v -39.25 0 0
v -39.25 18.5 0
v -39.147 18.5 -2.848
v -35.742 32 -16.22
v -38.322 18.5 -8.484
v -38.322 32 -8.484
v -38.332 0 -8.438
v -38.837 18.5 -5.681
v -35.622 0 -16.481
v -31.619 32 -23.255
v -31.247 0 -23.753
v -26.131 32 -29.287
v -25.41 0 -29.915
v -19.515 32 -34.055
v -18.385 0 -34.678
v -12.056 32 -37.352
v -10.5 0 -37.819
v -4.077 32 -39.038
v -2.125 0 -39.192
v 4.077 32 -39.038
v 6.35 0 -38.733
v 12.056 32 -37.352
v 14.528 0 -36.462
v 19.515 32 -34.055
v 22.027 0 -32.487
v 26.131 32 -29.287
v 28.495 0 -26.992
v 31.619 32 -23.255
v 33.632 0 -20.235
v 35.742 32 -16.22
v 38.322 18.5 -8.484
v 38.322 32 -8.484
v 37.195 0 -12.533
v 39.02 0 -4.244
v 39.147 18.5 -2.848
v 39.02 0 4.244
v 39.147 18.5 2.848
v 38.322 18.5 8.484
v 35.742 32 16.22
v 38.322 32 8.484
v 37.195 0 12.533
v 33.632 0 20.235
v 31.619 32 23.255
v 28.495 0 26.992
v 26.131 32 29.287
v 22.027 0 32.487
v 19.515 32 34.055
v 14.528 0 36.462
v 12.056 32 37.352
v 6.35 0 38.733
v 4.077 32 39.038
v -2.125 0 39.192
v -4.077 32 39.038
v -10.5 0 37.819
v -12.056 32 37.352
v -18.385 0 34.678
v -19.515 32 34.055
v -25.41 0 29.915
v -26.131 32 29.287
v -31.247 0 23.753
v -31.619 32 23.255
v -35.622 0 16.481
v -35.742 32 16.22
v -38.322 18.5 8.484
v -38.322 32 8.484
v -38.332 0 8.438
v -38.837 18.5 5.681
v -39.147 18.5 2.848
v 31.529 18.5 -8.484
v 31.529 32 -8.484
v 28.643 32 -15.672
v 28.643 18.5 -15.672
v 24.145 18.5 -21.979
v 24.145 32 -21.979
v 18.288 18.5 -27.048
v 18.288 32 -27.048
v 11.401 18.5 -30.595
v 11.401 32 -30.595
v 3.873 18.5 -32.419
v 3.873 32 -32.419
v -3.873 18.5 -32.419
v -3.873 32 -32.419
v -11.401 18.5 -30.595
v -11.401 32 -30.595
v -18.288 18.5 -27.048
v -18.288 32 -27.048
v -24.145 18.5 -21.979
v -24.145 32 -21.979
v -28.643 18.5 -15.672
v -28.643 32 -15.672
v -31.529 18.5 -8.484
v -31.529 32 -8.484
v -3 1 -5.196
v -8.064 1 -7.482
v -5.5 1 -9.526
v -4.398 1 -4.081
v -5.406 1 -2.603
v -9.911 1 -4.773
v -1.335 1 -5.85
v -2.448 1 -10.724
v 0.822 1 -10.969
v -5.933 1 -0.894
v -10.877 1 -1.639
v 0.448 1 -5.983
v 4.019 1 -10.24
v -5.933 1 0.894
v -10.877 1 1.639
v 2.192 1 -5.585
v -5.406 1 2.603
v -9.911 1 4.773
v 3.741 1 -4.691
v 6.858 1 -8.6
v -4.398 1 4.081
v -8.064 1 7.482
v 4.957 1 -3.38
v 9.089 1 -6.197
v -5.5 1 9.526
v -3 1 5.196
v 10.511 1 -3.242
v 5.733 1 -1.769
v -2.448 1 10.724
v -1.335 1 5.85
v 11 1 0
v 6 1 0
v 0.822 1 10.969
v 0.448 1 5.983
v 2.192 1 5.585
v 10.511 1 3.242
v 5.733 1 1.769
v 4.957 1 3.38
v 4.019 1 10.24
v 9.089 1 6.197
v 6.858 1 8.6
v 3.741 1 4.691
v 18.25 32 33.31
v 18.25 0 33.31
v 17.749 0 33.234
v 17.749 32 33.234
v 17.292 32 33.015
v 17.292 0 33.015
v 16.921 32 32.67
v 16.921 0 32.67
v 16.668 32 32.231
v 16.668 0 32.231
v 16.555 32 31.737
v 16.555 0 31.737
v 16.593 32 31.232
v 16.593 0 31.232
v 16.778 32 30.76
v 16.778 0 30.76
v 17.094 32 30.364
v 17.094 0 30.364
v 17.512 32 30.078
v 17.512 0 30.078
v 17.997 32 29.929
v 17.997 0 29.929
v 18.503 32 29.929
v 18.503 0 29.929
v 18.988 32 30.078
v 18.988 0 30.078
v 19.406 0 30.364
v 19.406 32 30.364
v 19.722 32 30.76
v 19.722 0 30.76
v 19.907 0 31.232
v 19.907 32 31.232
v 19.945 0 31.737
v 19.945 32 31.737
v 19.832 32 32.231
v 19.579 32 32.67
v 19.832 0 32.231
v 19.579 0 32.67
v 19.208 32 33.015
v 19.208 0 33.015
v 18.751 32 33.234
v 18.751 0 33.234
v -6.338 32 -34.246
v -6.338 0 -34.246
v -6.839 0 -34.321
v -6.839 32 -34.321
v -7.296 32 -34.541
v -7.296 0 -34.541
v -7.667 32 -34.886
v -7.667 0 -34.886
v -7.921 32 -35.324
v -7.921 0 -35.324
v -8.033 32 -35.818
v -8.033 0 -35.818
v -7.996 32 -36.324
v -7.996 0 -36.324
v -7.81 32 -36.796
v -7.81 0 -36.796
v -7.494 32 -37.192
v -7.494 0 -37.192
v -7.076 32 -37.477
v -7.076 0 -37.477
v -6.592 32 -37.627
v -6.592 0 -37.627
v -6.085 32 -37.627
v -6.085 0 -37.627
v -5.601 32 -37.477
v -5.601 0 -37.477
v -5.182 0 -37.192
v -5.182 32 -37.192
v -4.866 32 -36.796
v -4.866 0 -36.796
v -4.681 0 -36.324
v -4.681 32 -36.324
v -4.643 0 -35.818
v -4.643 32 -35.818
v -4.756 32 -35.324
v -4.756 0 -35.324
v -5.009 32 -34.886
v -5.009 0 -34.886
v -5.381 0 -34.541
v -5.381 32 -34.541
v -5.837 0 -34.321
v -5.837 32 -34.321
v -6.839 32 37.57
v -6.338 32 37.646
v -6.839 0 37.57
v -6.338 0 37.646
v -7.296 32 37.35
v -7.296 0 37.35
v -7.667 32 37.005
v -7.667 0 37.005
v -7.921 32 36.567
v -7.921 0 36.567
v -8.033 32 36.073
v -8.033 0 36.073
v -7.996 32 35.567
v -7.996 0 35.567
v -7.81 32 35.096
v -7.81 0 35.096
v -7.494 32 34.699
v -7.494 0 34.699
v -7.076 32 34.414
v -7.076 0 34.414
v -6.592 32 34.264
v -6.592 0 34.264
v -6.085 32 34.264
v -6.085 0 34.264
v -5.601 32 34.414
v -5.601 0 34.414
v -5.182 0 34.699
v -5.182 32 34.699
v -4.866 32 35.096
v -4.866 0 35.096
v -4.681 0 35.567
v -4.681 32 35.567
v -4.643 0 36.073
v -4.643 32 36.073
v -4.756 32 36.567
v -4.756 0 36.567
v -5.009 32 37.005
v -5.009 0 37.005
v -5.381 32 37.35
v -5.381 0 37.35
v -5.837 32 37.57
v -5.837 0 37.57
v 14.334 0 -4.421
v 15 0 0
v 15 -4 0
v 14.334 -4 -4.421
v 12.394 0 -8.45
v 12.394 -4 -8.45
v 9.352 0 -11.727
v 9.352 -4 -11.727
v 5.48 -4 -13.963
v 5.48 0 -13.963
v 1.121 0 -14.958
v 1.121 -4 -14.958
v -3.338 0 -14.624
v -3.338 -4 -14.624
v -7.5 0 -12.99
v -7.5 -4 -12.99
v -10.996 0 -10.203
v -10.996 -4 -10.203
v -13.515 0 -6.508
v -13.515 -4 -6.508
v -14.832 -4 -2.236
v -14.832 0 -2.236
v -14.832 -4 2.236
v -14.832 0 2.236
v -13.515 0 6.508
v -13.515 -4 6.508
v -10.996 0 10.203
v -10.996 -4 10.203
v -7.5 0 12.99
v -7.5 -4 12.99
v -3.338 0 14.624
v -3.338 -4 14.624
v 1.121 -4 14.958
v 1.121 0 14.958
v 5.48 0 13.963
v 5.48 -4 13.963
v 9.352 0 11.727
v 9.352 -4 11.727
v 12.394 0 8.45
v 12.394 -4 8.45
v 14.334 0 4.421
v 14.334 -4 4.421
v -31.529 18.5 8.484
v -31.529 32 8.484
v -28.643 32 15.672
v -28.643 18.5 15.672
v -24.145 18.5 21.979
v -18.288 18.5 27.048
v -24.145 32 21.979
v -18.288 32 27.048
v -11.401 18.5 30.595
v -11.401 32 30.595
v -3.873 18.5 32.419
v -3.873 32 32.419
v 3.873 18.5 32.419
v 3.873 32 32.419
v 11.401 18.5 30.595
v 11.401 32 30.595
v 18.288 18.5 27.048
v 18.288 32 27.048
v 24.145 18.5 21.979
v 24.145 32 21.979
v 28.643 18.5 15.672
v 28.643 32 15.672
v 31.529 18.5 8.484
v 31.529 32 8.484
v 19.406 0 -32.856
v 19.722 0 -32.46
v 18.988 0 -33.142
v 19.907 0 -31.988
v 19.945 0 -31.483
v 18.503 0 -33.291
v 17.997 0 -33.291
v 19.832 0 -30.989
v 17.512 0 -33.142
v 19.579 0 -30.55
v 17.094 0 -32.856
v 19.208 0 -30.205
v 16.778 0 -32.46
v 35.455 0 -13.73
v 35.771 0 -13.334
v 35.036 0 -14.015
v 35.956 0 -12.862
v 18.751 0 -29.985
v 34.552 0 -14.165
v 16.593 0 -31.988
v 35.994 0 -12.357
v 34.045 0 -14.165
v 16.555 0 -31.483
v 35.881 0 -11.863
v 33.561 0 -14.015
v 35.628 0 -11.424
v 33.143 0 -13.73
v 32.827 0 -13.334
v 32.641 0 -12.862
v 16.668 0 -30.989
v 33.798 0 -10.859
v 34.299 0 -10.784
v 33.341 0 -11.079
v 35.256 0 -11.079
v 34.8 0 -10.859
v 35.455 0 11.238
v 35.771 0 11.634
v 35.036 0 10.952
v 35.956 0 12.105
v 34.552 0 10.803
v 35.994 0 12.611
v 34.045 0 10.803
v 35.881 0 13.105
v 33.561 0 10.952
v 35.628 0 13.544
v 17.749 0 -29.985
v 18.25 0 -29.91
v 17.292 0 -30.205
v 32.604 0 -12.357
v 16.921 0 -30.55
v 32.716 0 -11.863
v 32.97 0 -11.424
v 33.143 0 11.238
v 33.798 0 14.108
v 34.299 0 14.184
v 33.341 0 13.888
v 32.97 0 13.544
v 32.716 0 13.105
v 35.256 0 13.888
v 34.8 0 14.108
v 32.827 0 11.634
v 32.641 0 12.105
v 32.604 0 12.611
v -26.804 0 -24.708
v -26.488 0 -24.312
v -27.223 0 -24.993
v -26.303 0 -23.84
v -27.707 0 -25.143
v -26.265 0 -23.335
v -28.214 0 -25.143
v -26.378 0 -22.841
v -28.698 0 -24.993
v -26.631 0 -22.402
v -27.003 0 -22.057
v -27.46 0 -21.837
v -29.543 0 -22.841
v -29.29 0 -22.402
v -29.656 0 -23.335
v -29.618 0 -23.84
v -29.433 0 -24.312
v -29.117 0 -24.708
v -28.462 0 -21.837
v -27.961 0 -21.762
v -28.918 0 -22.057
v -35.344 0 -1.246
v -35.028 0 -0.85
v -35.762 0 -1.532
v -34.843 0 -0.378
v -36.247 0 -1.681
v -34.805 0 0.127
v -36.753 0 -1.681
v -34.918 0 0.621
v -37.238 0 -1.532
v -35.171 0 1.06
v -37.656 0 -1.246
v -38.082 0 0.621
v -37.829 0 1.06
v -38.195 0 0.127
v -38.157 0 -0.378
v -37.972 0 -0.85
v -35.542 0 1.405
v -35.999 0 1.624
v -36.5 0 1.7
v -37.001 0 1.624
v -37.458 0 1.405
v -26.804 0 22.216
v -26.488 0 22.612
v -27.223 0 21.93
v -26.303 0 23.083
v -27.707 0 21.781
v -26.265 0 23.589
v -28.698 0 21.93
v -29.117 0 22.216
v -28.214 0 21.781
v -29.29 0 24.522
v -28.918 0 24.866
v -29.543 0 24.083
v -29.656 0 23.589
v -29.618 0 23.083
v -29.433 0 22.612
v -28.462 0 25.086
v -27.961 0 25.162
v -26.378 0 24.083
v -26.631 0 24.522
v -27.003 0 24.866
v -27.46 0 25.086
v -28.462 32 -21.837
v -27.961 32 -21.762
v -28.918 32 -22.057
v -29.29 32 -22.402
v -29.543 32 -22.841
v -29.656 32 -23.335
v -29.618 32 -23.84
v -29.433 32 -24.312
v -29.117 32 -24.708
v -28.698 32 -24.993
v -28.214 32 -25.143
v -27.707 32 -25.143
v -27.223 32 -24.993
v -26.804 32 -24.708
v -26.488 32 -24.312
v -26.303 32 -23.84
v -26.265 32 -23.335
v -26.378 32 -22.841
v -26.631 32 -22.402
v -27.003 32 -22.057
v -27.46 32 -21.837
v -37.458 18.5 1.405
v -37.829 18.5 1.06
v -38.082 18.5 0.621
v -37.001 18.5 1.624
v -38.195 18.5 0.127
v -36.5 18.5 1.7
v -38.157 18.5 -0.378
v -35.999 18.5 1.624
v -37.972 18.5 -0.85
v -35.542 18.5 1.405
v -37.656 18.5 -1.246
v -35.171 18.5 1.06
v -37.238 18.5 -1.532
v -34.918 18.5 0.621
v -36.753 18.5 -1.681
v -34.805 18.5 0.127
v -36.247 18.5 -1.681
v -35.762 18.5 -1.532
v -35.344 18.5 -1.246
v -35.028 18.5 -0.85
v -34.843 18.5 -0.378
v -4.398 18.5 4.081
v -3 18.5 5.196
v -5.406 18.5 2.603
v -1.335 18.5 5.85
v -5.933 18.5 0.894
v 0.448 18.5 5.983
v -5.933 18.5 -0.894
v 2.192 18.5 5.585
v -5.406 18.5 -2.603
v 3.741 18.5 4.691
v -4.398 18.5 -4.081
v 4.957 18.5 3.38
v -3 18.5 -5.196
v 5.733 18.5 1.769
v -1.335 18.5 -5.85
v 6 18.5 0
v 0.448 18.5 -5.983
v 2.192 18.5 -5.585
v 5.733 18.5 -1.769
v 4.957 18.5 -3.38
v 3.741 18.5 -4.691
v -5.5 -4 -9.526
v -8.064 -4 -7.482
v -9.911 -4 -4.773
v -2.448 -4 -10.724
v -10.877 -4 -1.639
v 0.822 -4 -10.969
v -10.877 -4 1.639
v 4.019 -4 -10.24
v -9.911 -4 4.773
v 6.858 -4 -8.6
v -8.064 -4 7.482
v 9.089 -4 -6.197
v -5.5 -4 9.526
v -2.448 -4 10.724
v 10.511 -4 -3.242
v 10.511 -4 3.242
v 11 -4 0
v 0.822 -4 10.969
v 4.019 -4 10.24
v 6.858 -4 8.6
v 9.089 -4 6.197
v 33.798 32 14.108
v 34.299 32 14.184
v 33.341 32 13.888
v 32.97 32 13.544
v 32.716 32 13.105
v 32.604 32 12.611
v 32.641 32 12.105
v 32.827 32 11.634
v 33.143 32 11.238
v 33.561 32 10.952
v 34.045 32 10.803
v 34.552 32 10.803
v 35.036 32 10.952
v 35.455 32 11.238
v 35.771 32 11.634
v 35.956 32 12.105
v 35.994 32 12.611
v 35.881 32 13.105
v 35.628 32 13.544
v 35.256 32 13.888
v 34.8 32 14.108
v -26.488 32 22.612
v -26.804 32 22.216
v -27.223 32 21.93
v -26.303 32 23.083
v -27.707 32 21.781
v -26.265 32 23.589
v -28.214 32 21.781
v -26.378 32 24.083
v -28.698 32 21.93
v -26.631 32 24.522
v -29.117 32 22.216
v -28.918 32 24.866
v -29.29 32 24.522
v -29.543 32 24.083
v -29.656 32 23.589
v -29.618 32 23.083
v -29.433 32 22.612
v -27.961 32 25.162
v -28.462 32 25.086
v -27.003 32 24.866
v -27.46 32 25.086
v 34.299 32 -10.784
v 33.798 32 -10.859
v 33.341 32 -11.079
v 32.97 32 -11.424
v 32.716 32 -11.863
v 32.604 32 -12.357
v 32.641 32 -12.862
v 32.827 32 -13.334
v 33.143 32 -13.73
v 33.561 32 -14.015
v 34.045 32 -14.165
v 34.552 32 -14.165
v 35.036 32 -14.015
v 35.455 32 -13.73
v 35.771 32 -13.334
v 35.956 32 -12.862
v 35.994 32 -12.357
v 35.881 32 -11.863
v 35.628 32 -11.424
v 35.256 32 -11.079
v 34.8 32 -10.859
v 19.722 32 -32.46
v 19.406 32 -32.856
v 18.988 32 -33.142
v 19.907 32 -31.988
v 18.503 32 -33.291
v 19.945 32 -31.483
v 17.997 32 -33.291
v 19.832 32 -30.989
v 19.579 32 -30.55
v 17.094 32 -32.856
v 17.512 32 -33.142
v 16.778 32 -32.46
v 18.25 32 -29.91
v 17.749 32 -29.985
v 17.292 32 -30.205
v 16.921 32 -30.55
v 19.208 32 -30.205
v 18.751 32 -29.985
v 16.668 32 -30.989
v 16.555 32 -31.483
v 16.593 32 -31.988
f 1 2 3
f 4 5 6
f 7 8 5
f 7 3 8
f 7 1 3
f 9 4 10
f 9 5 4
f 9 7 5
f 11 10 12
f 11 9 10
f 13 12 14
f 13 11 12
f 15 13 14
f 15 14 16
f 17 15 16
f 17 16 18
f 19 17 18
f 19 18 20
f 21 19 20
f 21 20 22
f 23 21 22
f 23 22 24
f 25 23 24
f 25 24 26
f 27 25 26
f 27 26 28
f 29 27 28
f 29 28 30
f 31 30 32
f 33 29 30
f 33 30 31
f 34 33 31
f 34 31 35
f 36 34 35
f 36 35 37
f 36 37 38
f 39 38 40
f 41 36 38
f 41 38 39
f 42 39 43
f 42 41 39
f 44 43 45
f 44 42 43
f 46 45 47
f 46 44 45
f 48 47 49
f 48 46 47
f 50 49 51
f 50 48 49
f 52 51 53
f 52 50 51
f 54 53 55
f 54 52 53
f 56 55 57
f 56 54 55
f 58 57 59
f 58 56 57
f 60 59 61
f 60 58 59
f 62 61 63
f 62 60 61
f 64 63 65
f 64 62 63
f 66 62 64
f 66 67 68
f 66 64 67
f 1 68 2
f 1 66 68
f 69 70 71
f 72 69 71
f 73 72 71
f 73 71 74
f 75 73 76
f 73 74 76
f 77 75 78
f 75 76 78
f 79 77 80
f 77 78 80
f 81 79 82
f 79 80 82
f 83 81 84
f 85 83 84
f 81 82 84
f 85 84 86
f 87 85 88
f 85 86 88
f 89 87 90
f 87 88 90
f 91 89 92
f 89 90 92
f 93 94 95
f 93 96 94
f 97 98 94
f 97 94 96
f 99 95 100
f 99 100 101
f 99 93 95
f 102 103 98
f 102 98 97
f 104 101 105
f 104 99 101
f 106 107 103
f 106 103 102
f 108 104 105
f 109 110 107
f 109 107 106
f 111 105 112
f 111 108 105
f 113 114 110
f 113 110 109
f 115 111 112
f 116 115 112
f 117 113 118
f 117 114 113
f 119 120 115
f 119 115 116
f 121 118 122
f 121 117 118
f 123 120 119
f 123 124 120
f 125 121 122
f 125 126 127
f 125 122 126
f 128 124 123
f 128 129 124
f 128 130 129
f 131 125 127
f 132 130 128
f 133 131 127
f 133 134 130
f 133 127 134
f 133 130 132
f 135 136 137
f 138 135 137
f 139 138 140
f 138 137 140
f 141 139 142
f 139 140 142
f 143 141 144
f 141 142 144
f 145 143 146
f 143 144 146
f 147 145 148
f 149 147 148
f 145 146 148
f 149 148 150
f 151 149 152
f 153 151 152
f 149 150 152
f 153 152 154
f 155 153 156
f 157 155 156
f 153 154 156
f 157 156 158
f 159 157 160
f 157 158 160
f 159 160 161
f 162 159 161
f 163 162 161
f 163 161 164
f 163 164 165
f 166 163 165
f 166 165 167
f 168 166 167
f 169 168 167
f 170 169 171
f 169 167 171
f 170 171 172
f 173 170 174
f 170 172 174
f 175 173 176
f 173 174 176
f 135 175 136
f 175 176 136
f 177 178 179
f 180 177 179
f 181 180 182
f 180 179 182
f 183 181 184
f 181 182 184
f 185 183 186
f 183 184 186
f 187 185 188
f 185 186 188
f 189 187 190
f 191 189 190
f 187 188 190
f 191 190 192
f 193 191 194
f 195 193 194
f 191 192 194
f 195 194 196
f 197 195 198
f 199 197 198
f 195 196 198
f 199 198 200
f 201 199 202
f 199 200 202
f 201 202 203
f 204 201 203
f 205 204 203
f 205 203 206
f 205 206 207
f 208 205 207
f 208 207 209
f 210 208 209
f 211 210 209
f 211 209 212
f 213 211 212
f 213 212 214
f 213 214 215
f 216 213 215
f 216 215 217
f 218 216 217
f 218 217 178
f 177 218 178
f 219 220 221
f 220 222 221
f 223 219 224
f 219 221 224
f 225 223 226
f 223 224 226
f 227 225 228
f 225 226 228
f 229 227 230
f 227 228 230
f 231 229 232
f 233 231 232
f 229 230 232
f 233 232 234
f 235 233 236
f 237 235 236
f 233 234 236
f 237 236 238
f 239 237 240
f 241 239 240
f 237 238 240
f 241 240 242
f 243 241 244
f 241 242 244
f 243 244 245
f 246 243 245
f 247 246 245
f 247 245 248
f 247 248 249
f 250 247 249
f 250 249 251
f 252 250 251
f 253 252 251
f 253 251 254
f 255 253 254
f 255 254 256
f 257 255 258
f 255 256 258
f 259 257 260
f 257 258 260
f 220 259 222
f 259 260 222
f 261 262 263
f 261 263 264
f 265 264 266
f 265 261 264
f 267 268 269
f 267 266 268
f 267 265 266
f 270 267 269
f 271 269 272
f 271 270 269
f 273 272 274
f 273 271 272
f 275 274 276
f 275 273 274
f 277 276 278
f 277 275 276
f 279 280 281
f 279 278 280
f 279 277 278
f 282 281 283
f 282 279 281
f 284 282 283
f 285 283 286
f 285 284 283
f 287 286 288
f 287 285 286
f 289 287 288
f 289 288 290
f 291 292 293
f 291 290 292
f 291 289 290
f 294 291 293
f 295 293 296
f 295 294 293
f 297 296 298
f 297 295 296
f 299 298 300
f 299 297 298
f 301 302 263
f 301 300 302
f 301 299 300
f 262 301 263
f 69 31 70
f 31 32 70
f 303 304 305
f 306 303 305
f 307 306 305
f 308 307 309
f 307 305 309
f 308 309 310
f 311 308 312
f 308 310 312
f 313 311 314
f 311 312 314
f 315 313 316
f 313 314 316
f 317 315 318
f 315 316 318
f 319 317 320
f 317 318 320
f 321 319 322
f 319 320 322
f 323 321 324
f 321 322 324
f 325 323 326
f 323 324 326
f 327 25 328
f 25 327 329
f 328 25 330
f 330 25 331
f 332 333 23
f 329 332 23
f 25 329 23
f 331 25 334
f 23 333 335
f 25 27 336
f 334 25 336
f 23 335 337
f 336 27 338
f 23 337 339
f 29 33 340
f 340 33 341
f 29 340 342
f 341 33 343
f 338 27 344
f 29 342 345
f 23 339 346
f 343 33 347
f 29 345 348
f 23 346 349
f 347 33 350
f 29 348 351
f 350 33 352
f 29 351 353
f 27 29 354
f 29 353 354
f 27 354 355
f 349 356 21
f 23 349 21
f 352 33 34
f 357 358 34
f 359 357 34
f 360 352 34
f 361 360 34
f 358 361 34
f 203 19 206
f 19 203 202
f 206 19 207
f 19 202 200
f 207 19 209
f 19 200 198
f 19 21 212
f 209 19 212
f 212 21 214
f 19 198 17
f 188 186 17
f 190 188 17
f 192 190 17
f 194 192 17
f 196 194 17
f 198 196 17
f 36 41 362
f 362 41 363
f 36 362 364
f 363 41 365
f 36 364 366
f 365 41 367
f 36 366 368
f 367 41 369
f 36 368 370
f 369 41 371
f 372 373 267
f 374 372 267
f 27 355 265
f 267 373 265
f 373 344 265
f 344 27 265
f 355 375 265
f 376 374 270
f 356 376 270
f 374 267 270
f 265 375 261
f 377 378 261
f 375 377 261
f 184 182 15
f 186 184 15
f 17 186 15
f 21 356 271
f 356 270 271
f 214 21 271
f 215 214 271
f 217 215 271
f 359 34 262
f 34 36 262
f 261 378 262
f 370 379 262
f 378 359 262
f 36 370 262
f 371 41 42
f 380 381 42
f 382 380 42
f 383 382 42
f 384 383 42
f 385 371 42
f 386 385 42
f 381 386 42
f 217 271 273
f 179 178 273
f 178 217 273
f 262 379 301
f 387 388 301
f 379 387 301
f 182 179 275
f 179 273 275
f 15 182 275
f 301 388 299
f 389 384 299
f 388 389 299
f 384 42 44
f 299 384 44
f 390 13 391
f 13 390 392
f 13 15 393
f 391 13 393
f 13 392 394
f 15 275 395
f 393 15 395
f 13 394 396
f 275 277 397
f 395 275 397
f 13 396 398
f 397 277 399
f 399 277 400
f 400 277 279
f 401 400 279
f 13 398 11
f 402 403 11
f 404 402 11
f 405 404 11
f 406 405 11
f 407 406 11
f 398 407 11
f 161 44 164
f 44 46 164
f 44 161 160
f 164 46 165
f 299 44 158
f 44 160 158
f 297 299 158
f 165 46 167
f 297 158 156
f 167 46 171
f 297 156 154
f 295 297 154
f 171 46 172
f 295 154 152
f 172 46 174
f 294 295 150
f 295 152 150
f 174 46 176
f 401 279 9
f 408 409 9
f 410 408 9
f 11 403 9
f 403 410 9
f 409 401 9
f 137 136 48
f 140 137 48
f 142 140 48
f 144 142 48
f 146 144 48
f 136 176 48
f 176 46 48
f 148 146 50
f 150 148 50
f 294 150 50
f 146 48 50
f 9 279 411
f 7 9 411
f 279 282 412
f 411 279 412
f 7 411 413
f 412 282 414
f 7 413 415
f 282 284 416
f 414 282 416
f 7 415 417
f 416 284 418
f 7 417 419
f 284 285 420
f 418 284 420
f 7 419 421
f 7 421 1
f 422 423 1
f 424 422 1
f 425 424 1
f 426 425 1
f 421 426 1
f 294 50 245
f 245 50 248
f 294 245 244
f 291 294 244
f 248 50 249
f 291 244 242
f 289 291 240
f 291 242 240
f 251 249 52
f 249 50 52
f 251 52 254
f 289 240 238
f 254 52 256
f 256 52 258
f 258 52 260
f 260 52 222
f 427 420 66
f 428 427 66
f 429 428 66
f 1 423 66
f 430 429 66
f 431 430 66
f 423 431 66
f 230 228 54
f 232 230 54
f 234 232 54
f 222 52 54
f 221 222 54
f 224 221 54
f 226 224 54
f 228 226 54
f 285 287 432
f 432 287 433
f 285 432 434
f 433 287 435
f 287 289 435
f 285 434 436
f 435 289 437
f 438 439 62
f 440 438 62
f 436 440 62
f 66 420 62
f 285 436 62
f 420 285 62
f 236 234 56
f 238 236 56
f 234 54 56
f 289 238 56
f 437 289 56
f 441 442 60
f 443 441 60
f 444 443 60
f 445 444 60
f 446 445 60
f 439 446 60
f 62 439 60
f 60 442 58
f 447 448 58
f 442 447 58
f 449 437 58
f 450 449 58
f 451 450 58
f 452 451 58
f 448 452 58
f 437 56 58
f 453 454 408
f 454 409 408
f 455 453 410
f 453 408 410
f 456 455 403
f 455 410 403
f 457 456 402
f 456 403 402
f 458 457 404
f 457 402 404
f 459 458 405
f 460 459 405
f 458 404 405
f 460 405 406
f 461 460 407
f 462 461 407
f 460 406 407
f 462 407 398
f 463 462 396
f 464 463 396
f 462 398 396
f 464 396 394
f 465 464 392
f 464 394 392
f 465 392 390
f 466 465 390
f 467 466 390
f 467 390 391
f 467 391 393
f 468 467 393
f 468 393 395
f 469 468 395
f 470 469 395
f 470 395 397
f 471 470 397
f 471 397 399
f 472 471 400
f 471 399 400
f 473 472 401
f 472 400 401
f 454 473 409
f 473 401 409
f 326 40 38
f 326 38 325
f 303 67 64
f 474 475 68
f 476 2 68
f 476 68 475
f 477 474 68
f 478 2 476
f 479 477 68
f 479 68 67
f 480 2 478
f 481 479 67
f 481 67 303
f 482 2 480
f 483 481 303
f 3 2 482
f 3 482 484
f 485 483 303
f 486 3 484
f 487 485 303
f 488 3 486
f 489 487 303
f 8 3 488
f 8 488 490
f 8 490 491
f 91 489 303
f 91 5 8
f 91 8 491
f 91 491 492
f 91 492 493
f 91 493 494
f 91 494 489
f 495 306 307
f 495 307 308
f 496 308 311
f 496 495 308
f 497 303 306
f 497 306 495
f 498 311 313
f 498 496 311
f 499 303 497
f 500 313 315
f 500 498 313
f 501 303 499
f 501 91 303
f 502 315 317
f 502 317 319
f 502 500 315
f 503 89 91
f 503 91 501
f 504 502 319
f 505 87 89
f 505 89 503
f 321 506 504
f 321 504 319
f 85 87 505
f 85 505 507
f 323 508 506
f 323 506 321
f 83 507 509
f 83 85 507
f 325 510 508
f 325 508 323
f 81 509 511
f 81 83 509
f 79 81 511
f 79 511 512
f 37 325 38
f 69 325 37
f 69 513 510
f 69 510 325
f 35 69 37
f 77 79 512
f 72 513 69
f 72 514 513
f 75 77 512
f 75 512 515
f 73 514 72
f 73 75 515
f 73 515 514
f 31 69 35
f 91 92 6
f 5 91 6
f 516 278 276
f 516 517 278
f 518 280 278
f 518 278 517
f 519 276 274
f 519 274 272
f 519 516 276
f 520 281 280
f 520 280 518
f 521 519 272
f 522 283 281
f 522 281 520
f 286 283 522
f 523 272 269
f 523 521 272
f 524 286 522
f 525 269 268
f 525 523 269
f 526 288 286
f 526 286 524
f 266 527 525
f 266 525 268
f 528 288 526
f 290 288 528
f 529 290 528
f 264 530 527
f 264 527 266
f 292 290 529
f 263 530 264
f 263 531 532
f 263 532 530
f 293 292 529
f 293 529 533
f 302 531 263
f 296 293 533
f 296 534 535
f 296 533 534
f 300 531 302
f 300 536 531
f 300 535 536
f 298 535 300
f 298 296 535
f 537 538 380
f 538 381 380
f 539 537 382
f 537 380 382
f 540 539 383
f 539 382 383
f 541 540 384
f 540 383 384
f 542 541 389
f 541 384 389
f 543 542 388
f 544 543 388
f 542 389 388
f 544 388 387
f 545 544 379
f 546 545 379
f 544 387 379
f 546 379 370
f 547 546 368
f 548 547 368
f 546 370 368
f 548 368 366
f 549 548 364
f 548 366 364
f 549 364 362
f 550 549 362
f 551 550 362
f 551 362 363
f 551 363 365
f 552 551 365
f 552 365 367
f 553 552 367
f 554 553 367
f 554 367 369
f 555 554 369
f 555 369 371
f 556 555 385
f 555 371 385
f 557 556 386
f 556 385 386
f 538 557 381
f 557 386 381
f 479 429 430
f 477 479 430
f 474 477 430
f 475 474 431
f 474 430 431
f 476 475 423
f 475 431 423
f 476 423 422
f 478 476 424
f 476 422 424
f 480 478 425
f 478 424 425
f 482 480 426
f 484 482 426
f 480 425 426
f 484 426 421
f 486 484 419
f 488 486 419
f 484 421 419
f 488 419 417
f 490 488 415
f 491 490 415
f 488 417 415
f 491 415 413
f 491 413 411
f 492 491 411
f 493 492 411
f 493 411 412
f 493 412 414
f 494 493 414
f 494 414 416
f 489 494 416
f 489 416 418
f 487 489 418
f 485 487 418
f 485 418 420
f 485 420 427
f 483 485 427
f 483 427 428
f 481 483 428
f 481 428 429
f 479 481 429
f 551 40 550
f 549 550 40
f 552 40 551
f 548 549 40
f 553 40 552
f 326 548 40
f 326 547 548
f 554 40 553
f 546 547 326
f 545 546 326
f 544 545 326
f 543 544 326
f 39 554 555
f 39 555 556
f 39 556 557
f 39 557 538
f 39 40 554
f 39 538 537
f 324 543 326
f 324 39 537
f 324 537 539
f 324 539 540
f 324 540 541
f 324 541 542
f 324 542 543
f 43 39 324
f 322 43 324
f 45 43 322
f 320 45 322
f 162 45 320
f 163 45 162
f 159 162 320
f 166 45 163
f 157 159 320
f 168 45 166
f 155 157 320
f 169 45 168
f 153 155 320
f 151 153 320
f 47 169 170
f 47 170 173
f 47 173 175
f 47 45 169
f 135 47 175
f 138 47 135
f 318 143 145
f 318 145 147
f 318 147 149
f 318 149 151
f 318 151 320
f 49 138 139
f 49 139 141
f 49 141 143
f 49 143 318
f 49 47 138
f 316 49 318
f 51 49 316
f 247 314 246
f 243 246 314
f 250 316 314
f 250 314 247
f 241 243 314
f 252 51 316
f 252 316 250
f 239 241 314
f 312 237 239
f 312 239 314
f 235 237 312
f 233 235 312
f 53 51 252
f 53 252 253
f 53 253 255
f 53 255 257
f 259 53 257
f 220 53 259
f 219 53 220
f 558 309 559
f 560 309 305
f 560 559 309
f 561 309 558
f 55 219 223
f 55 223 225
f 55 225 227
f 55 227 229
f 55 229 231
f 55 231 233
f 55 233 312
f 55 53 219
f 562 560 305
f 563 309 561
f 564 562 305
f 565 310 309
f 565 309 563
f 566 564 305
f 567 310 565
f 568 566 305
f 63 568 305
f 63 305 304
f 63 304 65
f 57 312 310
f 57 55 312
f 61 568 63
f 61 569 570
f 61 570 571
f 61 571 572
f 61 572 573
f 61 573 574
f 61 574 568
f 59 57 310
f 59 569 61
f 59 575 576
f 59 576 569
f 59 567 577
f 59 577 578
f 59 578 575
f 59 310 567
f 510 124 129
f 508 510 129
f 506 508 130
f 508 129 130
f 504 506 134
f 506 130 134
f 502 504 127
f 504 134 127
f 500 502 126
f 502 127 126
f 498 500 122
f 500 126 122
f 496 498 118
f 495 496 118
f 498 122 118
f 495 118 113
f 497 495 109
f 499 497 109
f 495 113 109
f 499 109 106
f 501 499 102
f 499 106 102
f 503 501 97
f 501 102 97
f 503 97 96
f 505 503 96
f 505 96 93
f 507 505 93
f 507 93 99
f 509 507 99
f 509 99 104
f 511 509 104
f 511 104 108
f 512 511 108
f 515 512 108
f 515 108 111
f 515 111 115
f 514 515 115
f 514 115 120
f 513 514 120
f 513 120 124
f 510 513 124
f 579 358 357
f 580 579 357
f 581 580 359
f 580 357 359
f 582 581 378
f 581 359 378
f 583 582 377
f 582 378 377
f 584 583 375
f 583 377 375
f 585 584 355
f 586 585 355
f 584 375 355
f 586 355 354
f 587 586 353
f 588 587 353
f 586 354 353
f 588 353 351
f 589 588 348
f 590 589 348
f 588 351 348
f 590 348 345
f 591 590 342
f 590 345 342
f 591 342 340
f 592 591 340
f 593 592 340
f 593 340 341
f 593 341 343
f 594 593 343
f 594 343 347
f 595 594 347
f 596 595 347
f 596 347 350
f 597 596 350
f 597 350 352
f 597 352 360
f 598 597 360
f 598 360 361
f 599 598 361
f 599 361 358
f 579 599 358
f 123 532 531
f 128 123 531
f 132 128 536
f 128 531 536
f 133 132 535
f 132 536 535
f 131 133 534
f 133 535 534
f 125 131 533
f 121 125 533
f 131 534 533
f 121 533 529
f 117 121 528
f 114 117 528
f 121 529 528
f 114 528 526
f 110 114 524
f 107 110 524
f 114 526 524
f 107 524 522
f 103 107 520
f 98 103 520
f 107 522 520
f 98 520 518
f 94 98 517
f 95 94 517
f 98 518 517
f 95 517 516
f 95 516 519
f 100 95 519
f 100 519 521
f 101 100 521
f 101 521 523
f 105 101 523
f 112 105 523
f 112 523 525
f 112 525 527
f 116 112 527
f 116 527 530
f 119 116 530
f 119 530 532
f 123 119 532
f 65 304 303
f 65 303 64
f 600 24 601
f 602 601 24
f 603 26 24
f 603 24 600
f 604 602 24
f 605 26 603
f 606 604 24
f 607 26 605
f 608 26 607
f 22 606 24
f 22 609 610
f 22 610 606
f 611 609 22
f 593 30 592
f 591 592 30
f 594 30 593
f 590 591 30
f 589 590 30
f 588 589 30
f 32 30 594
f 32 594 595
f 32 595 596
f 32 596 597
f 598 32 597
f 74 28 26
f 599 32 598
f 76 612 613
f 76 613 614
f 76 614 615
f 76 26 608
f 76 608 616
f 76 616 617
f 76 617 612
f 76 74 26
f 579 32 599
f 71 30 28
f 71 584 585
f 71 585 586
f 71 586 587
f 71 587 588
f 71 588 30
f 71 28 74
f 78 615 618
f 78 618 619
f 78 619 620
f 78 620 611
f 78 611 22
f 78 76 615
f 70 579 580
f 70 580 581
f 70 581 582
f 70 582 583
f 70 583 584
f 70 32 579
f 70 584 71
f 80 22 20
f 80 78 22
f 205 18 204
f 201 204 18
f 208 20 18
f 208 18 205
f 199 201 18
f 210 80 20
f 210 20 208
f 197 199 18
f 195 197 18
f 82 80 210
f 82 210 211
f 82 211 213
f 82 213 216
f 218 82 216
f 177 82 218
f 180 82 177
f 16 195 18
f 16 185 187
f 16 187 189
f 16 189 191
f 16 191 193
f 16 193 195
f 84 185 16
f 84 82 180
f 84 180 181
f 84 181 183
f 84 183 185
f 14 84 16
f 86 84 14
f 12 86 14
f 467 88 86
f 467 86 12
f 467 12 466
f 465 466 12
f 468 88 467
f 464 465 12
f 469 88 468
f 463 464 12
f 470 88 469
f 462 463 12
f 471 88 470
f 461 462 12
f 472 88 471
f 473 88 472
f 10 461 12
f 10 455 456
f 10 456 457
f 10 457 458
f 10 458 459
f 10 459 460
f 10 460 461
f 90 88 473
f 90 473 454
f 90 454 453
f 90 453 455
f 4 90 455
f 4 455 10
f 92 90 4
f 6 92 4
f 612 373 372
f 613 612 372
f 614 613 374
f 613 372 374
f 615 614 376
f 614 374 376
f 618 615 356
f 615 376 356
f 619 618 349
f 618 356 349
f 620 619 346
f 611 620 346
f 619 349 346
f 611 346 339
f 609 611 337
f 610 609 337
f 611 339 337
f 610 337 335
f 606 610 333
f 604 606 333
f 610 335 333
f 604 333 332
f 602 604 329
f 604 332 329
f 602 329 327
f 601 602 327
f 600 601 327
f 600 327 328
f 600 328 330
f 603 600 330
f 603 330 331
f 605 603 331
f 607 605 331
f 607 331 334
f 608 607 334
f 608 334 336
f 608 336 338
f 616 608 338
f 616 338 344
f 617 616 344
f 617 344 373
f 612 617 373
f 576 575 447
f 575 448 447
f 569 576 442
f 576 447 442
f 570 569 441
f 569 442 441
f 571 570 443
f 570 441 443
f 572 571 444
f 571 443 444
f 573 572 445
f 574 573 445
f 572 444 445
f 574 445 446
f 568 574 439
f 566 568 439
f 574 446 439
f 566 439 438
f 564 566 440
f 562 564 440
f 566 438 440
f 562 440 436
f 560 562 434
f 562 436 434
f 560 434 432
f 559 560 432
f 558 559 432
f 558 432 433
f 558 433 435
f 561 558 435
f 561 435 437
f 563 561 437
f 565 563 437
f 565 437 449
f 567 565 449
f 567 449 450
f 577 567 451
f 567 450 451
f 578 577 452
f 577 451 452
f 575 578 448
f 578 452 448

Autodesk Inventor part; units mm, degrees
ref_plane "YZ Plane" through (0, 0, 0) normal (1, 0, 0) x (0, 1, 0)
ref_plane "XZ Plane" through (0, 0, 0) normal (0, 1, 0) x (-1, 0, 0)
ref_plane "XY Plane" through (0, 0, 0) normal (0, 0, 1) x (1, 0, 0)
sketch "スケッチ1" plane through (0, 0, 0) normal (0, 1, 0) x (-1, 0, 0)
  circle A0 centre (0, 0) radius 39.25
  dimension "d0" = 78.5
extrude "押し出し1" add sketch "スケッチ1" along normal blind 32
sketch "スケッチ2" plane through (0, 32, 0) normal (0, 1, 0) x (1, 0, 0)
  circle A0 centre (0, 0) radius 32.65
  dimension "d3" = 65.3
extrude "押し出し2" cut sketch "スケッチ2" against normal blind 13.5
sketch "スケッチ3" plane through (0, 32, 0) normal (0, 1, 0) x (1, 0, 0)
  circle A0 centre (0, 0) radius 36.5
  point P0 (-36.5, 0)
  point P1 (-27.9606, -23.4617)
  point P2 (-6.3382, -35.9455)
  point P3 (18.25, -31.6099)
  point P4 (34.2988, -12.4837)
  point P5 (34.2988, 12.4837)
  point P6 (18.25, 31.6099)
  point P7 (-6.3382, 35.9455)
  point P8 (-27.9606, 23.4617)
  dimension "d6" = 73
  dimension "d9" = 360
hole "穴1" at (-36.5, 32, 0) at (-27.9606, 32, 23.4617) at (-6.3382, 32, 35.9455) at (18.25, 32, 31.6099) at (34.2988, 32, 12.4837) at (34.2988, 32, -12.4837) at (18.25, 32, -31.6099) at (-6.3382, 32, -35.9455) at (-27.9606, 32, -23.4617) direction (0, -1, 0) diameter 3.4 end through all
sketch "スケッチ4" plane through (0, 32, 0) normal (0, 1, 0) x (1, 0, 0)
  circle A0 centre (0, 0) radius 39.25 projected
  line L0 (38.3222, -8.4837) -> (-38.3222, -8.4837)
  line L1 (0, 0) -> (39.25, 0)
  circle A1 centre (34.2988, -12.4837) radius 1.7 projected
  line L2 (38.3222, 8.4837) -> (-38.3222, 8.4837)
  dimension "d18" = 4
extrude "押し出し3" cut sketch "スケッチ4" against normal blind 13.5 contours A0 L0 L2
sketch "スケッチ5" plane through (0, 18.5, 0) normal (0, 1, 0) x (1, 0, 0)
  circle A0 centre (-36.5, 0) radius 1.7 projected
  circle A1 centre (-36.5, 0) radius 3
  point P0 (0, 0)
  dimension "d21" = 6
extrude "押し出し4" [suppressed]
sketch "スケッチ6" plane through (0, 0, 0) normal (0, -1, 0) x (1, 0, 0)
  circle A0 centre (0, 0) radius 15
  dimension "d24" = 30
extrude "押し出し5" add sketch "スケッチ6" along normal blind 4
sketch "スケッチ7" plane through (0, -4, 0) normal (0, -1, 0) x (1, 0, 0)
  circle A0 centre (0, 0) radius 6
  dimension "d27" = 12
extrude "押し出し6" cut sketch "スケッチ7" against normal blind 40
sketch "スケッチ8" plane through (0, -4, 0) normal (0, -1, 0) x (1, 0, 0)
  circle A0 centre (0, 0) radius 6 projected
  circle A1 centre (0, 0) radius 11
  dimension "d30" = 22
extrude "押し出し7" cut sketch "スケッチ8" against normal blind 5
properties part number "servofixpart_forR2"
